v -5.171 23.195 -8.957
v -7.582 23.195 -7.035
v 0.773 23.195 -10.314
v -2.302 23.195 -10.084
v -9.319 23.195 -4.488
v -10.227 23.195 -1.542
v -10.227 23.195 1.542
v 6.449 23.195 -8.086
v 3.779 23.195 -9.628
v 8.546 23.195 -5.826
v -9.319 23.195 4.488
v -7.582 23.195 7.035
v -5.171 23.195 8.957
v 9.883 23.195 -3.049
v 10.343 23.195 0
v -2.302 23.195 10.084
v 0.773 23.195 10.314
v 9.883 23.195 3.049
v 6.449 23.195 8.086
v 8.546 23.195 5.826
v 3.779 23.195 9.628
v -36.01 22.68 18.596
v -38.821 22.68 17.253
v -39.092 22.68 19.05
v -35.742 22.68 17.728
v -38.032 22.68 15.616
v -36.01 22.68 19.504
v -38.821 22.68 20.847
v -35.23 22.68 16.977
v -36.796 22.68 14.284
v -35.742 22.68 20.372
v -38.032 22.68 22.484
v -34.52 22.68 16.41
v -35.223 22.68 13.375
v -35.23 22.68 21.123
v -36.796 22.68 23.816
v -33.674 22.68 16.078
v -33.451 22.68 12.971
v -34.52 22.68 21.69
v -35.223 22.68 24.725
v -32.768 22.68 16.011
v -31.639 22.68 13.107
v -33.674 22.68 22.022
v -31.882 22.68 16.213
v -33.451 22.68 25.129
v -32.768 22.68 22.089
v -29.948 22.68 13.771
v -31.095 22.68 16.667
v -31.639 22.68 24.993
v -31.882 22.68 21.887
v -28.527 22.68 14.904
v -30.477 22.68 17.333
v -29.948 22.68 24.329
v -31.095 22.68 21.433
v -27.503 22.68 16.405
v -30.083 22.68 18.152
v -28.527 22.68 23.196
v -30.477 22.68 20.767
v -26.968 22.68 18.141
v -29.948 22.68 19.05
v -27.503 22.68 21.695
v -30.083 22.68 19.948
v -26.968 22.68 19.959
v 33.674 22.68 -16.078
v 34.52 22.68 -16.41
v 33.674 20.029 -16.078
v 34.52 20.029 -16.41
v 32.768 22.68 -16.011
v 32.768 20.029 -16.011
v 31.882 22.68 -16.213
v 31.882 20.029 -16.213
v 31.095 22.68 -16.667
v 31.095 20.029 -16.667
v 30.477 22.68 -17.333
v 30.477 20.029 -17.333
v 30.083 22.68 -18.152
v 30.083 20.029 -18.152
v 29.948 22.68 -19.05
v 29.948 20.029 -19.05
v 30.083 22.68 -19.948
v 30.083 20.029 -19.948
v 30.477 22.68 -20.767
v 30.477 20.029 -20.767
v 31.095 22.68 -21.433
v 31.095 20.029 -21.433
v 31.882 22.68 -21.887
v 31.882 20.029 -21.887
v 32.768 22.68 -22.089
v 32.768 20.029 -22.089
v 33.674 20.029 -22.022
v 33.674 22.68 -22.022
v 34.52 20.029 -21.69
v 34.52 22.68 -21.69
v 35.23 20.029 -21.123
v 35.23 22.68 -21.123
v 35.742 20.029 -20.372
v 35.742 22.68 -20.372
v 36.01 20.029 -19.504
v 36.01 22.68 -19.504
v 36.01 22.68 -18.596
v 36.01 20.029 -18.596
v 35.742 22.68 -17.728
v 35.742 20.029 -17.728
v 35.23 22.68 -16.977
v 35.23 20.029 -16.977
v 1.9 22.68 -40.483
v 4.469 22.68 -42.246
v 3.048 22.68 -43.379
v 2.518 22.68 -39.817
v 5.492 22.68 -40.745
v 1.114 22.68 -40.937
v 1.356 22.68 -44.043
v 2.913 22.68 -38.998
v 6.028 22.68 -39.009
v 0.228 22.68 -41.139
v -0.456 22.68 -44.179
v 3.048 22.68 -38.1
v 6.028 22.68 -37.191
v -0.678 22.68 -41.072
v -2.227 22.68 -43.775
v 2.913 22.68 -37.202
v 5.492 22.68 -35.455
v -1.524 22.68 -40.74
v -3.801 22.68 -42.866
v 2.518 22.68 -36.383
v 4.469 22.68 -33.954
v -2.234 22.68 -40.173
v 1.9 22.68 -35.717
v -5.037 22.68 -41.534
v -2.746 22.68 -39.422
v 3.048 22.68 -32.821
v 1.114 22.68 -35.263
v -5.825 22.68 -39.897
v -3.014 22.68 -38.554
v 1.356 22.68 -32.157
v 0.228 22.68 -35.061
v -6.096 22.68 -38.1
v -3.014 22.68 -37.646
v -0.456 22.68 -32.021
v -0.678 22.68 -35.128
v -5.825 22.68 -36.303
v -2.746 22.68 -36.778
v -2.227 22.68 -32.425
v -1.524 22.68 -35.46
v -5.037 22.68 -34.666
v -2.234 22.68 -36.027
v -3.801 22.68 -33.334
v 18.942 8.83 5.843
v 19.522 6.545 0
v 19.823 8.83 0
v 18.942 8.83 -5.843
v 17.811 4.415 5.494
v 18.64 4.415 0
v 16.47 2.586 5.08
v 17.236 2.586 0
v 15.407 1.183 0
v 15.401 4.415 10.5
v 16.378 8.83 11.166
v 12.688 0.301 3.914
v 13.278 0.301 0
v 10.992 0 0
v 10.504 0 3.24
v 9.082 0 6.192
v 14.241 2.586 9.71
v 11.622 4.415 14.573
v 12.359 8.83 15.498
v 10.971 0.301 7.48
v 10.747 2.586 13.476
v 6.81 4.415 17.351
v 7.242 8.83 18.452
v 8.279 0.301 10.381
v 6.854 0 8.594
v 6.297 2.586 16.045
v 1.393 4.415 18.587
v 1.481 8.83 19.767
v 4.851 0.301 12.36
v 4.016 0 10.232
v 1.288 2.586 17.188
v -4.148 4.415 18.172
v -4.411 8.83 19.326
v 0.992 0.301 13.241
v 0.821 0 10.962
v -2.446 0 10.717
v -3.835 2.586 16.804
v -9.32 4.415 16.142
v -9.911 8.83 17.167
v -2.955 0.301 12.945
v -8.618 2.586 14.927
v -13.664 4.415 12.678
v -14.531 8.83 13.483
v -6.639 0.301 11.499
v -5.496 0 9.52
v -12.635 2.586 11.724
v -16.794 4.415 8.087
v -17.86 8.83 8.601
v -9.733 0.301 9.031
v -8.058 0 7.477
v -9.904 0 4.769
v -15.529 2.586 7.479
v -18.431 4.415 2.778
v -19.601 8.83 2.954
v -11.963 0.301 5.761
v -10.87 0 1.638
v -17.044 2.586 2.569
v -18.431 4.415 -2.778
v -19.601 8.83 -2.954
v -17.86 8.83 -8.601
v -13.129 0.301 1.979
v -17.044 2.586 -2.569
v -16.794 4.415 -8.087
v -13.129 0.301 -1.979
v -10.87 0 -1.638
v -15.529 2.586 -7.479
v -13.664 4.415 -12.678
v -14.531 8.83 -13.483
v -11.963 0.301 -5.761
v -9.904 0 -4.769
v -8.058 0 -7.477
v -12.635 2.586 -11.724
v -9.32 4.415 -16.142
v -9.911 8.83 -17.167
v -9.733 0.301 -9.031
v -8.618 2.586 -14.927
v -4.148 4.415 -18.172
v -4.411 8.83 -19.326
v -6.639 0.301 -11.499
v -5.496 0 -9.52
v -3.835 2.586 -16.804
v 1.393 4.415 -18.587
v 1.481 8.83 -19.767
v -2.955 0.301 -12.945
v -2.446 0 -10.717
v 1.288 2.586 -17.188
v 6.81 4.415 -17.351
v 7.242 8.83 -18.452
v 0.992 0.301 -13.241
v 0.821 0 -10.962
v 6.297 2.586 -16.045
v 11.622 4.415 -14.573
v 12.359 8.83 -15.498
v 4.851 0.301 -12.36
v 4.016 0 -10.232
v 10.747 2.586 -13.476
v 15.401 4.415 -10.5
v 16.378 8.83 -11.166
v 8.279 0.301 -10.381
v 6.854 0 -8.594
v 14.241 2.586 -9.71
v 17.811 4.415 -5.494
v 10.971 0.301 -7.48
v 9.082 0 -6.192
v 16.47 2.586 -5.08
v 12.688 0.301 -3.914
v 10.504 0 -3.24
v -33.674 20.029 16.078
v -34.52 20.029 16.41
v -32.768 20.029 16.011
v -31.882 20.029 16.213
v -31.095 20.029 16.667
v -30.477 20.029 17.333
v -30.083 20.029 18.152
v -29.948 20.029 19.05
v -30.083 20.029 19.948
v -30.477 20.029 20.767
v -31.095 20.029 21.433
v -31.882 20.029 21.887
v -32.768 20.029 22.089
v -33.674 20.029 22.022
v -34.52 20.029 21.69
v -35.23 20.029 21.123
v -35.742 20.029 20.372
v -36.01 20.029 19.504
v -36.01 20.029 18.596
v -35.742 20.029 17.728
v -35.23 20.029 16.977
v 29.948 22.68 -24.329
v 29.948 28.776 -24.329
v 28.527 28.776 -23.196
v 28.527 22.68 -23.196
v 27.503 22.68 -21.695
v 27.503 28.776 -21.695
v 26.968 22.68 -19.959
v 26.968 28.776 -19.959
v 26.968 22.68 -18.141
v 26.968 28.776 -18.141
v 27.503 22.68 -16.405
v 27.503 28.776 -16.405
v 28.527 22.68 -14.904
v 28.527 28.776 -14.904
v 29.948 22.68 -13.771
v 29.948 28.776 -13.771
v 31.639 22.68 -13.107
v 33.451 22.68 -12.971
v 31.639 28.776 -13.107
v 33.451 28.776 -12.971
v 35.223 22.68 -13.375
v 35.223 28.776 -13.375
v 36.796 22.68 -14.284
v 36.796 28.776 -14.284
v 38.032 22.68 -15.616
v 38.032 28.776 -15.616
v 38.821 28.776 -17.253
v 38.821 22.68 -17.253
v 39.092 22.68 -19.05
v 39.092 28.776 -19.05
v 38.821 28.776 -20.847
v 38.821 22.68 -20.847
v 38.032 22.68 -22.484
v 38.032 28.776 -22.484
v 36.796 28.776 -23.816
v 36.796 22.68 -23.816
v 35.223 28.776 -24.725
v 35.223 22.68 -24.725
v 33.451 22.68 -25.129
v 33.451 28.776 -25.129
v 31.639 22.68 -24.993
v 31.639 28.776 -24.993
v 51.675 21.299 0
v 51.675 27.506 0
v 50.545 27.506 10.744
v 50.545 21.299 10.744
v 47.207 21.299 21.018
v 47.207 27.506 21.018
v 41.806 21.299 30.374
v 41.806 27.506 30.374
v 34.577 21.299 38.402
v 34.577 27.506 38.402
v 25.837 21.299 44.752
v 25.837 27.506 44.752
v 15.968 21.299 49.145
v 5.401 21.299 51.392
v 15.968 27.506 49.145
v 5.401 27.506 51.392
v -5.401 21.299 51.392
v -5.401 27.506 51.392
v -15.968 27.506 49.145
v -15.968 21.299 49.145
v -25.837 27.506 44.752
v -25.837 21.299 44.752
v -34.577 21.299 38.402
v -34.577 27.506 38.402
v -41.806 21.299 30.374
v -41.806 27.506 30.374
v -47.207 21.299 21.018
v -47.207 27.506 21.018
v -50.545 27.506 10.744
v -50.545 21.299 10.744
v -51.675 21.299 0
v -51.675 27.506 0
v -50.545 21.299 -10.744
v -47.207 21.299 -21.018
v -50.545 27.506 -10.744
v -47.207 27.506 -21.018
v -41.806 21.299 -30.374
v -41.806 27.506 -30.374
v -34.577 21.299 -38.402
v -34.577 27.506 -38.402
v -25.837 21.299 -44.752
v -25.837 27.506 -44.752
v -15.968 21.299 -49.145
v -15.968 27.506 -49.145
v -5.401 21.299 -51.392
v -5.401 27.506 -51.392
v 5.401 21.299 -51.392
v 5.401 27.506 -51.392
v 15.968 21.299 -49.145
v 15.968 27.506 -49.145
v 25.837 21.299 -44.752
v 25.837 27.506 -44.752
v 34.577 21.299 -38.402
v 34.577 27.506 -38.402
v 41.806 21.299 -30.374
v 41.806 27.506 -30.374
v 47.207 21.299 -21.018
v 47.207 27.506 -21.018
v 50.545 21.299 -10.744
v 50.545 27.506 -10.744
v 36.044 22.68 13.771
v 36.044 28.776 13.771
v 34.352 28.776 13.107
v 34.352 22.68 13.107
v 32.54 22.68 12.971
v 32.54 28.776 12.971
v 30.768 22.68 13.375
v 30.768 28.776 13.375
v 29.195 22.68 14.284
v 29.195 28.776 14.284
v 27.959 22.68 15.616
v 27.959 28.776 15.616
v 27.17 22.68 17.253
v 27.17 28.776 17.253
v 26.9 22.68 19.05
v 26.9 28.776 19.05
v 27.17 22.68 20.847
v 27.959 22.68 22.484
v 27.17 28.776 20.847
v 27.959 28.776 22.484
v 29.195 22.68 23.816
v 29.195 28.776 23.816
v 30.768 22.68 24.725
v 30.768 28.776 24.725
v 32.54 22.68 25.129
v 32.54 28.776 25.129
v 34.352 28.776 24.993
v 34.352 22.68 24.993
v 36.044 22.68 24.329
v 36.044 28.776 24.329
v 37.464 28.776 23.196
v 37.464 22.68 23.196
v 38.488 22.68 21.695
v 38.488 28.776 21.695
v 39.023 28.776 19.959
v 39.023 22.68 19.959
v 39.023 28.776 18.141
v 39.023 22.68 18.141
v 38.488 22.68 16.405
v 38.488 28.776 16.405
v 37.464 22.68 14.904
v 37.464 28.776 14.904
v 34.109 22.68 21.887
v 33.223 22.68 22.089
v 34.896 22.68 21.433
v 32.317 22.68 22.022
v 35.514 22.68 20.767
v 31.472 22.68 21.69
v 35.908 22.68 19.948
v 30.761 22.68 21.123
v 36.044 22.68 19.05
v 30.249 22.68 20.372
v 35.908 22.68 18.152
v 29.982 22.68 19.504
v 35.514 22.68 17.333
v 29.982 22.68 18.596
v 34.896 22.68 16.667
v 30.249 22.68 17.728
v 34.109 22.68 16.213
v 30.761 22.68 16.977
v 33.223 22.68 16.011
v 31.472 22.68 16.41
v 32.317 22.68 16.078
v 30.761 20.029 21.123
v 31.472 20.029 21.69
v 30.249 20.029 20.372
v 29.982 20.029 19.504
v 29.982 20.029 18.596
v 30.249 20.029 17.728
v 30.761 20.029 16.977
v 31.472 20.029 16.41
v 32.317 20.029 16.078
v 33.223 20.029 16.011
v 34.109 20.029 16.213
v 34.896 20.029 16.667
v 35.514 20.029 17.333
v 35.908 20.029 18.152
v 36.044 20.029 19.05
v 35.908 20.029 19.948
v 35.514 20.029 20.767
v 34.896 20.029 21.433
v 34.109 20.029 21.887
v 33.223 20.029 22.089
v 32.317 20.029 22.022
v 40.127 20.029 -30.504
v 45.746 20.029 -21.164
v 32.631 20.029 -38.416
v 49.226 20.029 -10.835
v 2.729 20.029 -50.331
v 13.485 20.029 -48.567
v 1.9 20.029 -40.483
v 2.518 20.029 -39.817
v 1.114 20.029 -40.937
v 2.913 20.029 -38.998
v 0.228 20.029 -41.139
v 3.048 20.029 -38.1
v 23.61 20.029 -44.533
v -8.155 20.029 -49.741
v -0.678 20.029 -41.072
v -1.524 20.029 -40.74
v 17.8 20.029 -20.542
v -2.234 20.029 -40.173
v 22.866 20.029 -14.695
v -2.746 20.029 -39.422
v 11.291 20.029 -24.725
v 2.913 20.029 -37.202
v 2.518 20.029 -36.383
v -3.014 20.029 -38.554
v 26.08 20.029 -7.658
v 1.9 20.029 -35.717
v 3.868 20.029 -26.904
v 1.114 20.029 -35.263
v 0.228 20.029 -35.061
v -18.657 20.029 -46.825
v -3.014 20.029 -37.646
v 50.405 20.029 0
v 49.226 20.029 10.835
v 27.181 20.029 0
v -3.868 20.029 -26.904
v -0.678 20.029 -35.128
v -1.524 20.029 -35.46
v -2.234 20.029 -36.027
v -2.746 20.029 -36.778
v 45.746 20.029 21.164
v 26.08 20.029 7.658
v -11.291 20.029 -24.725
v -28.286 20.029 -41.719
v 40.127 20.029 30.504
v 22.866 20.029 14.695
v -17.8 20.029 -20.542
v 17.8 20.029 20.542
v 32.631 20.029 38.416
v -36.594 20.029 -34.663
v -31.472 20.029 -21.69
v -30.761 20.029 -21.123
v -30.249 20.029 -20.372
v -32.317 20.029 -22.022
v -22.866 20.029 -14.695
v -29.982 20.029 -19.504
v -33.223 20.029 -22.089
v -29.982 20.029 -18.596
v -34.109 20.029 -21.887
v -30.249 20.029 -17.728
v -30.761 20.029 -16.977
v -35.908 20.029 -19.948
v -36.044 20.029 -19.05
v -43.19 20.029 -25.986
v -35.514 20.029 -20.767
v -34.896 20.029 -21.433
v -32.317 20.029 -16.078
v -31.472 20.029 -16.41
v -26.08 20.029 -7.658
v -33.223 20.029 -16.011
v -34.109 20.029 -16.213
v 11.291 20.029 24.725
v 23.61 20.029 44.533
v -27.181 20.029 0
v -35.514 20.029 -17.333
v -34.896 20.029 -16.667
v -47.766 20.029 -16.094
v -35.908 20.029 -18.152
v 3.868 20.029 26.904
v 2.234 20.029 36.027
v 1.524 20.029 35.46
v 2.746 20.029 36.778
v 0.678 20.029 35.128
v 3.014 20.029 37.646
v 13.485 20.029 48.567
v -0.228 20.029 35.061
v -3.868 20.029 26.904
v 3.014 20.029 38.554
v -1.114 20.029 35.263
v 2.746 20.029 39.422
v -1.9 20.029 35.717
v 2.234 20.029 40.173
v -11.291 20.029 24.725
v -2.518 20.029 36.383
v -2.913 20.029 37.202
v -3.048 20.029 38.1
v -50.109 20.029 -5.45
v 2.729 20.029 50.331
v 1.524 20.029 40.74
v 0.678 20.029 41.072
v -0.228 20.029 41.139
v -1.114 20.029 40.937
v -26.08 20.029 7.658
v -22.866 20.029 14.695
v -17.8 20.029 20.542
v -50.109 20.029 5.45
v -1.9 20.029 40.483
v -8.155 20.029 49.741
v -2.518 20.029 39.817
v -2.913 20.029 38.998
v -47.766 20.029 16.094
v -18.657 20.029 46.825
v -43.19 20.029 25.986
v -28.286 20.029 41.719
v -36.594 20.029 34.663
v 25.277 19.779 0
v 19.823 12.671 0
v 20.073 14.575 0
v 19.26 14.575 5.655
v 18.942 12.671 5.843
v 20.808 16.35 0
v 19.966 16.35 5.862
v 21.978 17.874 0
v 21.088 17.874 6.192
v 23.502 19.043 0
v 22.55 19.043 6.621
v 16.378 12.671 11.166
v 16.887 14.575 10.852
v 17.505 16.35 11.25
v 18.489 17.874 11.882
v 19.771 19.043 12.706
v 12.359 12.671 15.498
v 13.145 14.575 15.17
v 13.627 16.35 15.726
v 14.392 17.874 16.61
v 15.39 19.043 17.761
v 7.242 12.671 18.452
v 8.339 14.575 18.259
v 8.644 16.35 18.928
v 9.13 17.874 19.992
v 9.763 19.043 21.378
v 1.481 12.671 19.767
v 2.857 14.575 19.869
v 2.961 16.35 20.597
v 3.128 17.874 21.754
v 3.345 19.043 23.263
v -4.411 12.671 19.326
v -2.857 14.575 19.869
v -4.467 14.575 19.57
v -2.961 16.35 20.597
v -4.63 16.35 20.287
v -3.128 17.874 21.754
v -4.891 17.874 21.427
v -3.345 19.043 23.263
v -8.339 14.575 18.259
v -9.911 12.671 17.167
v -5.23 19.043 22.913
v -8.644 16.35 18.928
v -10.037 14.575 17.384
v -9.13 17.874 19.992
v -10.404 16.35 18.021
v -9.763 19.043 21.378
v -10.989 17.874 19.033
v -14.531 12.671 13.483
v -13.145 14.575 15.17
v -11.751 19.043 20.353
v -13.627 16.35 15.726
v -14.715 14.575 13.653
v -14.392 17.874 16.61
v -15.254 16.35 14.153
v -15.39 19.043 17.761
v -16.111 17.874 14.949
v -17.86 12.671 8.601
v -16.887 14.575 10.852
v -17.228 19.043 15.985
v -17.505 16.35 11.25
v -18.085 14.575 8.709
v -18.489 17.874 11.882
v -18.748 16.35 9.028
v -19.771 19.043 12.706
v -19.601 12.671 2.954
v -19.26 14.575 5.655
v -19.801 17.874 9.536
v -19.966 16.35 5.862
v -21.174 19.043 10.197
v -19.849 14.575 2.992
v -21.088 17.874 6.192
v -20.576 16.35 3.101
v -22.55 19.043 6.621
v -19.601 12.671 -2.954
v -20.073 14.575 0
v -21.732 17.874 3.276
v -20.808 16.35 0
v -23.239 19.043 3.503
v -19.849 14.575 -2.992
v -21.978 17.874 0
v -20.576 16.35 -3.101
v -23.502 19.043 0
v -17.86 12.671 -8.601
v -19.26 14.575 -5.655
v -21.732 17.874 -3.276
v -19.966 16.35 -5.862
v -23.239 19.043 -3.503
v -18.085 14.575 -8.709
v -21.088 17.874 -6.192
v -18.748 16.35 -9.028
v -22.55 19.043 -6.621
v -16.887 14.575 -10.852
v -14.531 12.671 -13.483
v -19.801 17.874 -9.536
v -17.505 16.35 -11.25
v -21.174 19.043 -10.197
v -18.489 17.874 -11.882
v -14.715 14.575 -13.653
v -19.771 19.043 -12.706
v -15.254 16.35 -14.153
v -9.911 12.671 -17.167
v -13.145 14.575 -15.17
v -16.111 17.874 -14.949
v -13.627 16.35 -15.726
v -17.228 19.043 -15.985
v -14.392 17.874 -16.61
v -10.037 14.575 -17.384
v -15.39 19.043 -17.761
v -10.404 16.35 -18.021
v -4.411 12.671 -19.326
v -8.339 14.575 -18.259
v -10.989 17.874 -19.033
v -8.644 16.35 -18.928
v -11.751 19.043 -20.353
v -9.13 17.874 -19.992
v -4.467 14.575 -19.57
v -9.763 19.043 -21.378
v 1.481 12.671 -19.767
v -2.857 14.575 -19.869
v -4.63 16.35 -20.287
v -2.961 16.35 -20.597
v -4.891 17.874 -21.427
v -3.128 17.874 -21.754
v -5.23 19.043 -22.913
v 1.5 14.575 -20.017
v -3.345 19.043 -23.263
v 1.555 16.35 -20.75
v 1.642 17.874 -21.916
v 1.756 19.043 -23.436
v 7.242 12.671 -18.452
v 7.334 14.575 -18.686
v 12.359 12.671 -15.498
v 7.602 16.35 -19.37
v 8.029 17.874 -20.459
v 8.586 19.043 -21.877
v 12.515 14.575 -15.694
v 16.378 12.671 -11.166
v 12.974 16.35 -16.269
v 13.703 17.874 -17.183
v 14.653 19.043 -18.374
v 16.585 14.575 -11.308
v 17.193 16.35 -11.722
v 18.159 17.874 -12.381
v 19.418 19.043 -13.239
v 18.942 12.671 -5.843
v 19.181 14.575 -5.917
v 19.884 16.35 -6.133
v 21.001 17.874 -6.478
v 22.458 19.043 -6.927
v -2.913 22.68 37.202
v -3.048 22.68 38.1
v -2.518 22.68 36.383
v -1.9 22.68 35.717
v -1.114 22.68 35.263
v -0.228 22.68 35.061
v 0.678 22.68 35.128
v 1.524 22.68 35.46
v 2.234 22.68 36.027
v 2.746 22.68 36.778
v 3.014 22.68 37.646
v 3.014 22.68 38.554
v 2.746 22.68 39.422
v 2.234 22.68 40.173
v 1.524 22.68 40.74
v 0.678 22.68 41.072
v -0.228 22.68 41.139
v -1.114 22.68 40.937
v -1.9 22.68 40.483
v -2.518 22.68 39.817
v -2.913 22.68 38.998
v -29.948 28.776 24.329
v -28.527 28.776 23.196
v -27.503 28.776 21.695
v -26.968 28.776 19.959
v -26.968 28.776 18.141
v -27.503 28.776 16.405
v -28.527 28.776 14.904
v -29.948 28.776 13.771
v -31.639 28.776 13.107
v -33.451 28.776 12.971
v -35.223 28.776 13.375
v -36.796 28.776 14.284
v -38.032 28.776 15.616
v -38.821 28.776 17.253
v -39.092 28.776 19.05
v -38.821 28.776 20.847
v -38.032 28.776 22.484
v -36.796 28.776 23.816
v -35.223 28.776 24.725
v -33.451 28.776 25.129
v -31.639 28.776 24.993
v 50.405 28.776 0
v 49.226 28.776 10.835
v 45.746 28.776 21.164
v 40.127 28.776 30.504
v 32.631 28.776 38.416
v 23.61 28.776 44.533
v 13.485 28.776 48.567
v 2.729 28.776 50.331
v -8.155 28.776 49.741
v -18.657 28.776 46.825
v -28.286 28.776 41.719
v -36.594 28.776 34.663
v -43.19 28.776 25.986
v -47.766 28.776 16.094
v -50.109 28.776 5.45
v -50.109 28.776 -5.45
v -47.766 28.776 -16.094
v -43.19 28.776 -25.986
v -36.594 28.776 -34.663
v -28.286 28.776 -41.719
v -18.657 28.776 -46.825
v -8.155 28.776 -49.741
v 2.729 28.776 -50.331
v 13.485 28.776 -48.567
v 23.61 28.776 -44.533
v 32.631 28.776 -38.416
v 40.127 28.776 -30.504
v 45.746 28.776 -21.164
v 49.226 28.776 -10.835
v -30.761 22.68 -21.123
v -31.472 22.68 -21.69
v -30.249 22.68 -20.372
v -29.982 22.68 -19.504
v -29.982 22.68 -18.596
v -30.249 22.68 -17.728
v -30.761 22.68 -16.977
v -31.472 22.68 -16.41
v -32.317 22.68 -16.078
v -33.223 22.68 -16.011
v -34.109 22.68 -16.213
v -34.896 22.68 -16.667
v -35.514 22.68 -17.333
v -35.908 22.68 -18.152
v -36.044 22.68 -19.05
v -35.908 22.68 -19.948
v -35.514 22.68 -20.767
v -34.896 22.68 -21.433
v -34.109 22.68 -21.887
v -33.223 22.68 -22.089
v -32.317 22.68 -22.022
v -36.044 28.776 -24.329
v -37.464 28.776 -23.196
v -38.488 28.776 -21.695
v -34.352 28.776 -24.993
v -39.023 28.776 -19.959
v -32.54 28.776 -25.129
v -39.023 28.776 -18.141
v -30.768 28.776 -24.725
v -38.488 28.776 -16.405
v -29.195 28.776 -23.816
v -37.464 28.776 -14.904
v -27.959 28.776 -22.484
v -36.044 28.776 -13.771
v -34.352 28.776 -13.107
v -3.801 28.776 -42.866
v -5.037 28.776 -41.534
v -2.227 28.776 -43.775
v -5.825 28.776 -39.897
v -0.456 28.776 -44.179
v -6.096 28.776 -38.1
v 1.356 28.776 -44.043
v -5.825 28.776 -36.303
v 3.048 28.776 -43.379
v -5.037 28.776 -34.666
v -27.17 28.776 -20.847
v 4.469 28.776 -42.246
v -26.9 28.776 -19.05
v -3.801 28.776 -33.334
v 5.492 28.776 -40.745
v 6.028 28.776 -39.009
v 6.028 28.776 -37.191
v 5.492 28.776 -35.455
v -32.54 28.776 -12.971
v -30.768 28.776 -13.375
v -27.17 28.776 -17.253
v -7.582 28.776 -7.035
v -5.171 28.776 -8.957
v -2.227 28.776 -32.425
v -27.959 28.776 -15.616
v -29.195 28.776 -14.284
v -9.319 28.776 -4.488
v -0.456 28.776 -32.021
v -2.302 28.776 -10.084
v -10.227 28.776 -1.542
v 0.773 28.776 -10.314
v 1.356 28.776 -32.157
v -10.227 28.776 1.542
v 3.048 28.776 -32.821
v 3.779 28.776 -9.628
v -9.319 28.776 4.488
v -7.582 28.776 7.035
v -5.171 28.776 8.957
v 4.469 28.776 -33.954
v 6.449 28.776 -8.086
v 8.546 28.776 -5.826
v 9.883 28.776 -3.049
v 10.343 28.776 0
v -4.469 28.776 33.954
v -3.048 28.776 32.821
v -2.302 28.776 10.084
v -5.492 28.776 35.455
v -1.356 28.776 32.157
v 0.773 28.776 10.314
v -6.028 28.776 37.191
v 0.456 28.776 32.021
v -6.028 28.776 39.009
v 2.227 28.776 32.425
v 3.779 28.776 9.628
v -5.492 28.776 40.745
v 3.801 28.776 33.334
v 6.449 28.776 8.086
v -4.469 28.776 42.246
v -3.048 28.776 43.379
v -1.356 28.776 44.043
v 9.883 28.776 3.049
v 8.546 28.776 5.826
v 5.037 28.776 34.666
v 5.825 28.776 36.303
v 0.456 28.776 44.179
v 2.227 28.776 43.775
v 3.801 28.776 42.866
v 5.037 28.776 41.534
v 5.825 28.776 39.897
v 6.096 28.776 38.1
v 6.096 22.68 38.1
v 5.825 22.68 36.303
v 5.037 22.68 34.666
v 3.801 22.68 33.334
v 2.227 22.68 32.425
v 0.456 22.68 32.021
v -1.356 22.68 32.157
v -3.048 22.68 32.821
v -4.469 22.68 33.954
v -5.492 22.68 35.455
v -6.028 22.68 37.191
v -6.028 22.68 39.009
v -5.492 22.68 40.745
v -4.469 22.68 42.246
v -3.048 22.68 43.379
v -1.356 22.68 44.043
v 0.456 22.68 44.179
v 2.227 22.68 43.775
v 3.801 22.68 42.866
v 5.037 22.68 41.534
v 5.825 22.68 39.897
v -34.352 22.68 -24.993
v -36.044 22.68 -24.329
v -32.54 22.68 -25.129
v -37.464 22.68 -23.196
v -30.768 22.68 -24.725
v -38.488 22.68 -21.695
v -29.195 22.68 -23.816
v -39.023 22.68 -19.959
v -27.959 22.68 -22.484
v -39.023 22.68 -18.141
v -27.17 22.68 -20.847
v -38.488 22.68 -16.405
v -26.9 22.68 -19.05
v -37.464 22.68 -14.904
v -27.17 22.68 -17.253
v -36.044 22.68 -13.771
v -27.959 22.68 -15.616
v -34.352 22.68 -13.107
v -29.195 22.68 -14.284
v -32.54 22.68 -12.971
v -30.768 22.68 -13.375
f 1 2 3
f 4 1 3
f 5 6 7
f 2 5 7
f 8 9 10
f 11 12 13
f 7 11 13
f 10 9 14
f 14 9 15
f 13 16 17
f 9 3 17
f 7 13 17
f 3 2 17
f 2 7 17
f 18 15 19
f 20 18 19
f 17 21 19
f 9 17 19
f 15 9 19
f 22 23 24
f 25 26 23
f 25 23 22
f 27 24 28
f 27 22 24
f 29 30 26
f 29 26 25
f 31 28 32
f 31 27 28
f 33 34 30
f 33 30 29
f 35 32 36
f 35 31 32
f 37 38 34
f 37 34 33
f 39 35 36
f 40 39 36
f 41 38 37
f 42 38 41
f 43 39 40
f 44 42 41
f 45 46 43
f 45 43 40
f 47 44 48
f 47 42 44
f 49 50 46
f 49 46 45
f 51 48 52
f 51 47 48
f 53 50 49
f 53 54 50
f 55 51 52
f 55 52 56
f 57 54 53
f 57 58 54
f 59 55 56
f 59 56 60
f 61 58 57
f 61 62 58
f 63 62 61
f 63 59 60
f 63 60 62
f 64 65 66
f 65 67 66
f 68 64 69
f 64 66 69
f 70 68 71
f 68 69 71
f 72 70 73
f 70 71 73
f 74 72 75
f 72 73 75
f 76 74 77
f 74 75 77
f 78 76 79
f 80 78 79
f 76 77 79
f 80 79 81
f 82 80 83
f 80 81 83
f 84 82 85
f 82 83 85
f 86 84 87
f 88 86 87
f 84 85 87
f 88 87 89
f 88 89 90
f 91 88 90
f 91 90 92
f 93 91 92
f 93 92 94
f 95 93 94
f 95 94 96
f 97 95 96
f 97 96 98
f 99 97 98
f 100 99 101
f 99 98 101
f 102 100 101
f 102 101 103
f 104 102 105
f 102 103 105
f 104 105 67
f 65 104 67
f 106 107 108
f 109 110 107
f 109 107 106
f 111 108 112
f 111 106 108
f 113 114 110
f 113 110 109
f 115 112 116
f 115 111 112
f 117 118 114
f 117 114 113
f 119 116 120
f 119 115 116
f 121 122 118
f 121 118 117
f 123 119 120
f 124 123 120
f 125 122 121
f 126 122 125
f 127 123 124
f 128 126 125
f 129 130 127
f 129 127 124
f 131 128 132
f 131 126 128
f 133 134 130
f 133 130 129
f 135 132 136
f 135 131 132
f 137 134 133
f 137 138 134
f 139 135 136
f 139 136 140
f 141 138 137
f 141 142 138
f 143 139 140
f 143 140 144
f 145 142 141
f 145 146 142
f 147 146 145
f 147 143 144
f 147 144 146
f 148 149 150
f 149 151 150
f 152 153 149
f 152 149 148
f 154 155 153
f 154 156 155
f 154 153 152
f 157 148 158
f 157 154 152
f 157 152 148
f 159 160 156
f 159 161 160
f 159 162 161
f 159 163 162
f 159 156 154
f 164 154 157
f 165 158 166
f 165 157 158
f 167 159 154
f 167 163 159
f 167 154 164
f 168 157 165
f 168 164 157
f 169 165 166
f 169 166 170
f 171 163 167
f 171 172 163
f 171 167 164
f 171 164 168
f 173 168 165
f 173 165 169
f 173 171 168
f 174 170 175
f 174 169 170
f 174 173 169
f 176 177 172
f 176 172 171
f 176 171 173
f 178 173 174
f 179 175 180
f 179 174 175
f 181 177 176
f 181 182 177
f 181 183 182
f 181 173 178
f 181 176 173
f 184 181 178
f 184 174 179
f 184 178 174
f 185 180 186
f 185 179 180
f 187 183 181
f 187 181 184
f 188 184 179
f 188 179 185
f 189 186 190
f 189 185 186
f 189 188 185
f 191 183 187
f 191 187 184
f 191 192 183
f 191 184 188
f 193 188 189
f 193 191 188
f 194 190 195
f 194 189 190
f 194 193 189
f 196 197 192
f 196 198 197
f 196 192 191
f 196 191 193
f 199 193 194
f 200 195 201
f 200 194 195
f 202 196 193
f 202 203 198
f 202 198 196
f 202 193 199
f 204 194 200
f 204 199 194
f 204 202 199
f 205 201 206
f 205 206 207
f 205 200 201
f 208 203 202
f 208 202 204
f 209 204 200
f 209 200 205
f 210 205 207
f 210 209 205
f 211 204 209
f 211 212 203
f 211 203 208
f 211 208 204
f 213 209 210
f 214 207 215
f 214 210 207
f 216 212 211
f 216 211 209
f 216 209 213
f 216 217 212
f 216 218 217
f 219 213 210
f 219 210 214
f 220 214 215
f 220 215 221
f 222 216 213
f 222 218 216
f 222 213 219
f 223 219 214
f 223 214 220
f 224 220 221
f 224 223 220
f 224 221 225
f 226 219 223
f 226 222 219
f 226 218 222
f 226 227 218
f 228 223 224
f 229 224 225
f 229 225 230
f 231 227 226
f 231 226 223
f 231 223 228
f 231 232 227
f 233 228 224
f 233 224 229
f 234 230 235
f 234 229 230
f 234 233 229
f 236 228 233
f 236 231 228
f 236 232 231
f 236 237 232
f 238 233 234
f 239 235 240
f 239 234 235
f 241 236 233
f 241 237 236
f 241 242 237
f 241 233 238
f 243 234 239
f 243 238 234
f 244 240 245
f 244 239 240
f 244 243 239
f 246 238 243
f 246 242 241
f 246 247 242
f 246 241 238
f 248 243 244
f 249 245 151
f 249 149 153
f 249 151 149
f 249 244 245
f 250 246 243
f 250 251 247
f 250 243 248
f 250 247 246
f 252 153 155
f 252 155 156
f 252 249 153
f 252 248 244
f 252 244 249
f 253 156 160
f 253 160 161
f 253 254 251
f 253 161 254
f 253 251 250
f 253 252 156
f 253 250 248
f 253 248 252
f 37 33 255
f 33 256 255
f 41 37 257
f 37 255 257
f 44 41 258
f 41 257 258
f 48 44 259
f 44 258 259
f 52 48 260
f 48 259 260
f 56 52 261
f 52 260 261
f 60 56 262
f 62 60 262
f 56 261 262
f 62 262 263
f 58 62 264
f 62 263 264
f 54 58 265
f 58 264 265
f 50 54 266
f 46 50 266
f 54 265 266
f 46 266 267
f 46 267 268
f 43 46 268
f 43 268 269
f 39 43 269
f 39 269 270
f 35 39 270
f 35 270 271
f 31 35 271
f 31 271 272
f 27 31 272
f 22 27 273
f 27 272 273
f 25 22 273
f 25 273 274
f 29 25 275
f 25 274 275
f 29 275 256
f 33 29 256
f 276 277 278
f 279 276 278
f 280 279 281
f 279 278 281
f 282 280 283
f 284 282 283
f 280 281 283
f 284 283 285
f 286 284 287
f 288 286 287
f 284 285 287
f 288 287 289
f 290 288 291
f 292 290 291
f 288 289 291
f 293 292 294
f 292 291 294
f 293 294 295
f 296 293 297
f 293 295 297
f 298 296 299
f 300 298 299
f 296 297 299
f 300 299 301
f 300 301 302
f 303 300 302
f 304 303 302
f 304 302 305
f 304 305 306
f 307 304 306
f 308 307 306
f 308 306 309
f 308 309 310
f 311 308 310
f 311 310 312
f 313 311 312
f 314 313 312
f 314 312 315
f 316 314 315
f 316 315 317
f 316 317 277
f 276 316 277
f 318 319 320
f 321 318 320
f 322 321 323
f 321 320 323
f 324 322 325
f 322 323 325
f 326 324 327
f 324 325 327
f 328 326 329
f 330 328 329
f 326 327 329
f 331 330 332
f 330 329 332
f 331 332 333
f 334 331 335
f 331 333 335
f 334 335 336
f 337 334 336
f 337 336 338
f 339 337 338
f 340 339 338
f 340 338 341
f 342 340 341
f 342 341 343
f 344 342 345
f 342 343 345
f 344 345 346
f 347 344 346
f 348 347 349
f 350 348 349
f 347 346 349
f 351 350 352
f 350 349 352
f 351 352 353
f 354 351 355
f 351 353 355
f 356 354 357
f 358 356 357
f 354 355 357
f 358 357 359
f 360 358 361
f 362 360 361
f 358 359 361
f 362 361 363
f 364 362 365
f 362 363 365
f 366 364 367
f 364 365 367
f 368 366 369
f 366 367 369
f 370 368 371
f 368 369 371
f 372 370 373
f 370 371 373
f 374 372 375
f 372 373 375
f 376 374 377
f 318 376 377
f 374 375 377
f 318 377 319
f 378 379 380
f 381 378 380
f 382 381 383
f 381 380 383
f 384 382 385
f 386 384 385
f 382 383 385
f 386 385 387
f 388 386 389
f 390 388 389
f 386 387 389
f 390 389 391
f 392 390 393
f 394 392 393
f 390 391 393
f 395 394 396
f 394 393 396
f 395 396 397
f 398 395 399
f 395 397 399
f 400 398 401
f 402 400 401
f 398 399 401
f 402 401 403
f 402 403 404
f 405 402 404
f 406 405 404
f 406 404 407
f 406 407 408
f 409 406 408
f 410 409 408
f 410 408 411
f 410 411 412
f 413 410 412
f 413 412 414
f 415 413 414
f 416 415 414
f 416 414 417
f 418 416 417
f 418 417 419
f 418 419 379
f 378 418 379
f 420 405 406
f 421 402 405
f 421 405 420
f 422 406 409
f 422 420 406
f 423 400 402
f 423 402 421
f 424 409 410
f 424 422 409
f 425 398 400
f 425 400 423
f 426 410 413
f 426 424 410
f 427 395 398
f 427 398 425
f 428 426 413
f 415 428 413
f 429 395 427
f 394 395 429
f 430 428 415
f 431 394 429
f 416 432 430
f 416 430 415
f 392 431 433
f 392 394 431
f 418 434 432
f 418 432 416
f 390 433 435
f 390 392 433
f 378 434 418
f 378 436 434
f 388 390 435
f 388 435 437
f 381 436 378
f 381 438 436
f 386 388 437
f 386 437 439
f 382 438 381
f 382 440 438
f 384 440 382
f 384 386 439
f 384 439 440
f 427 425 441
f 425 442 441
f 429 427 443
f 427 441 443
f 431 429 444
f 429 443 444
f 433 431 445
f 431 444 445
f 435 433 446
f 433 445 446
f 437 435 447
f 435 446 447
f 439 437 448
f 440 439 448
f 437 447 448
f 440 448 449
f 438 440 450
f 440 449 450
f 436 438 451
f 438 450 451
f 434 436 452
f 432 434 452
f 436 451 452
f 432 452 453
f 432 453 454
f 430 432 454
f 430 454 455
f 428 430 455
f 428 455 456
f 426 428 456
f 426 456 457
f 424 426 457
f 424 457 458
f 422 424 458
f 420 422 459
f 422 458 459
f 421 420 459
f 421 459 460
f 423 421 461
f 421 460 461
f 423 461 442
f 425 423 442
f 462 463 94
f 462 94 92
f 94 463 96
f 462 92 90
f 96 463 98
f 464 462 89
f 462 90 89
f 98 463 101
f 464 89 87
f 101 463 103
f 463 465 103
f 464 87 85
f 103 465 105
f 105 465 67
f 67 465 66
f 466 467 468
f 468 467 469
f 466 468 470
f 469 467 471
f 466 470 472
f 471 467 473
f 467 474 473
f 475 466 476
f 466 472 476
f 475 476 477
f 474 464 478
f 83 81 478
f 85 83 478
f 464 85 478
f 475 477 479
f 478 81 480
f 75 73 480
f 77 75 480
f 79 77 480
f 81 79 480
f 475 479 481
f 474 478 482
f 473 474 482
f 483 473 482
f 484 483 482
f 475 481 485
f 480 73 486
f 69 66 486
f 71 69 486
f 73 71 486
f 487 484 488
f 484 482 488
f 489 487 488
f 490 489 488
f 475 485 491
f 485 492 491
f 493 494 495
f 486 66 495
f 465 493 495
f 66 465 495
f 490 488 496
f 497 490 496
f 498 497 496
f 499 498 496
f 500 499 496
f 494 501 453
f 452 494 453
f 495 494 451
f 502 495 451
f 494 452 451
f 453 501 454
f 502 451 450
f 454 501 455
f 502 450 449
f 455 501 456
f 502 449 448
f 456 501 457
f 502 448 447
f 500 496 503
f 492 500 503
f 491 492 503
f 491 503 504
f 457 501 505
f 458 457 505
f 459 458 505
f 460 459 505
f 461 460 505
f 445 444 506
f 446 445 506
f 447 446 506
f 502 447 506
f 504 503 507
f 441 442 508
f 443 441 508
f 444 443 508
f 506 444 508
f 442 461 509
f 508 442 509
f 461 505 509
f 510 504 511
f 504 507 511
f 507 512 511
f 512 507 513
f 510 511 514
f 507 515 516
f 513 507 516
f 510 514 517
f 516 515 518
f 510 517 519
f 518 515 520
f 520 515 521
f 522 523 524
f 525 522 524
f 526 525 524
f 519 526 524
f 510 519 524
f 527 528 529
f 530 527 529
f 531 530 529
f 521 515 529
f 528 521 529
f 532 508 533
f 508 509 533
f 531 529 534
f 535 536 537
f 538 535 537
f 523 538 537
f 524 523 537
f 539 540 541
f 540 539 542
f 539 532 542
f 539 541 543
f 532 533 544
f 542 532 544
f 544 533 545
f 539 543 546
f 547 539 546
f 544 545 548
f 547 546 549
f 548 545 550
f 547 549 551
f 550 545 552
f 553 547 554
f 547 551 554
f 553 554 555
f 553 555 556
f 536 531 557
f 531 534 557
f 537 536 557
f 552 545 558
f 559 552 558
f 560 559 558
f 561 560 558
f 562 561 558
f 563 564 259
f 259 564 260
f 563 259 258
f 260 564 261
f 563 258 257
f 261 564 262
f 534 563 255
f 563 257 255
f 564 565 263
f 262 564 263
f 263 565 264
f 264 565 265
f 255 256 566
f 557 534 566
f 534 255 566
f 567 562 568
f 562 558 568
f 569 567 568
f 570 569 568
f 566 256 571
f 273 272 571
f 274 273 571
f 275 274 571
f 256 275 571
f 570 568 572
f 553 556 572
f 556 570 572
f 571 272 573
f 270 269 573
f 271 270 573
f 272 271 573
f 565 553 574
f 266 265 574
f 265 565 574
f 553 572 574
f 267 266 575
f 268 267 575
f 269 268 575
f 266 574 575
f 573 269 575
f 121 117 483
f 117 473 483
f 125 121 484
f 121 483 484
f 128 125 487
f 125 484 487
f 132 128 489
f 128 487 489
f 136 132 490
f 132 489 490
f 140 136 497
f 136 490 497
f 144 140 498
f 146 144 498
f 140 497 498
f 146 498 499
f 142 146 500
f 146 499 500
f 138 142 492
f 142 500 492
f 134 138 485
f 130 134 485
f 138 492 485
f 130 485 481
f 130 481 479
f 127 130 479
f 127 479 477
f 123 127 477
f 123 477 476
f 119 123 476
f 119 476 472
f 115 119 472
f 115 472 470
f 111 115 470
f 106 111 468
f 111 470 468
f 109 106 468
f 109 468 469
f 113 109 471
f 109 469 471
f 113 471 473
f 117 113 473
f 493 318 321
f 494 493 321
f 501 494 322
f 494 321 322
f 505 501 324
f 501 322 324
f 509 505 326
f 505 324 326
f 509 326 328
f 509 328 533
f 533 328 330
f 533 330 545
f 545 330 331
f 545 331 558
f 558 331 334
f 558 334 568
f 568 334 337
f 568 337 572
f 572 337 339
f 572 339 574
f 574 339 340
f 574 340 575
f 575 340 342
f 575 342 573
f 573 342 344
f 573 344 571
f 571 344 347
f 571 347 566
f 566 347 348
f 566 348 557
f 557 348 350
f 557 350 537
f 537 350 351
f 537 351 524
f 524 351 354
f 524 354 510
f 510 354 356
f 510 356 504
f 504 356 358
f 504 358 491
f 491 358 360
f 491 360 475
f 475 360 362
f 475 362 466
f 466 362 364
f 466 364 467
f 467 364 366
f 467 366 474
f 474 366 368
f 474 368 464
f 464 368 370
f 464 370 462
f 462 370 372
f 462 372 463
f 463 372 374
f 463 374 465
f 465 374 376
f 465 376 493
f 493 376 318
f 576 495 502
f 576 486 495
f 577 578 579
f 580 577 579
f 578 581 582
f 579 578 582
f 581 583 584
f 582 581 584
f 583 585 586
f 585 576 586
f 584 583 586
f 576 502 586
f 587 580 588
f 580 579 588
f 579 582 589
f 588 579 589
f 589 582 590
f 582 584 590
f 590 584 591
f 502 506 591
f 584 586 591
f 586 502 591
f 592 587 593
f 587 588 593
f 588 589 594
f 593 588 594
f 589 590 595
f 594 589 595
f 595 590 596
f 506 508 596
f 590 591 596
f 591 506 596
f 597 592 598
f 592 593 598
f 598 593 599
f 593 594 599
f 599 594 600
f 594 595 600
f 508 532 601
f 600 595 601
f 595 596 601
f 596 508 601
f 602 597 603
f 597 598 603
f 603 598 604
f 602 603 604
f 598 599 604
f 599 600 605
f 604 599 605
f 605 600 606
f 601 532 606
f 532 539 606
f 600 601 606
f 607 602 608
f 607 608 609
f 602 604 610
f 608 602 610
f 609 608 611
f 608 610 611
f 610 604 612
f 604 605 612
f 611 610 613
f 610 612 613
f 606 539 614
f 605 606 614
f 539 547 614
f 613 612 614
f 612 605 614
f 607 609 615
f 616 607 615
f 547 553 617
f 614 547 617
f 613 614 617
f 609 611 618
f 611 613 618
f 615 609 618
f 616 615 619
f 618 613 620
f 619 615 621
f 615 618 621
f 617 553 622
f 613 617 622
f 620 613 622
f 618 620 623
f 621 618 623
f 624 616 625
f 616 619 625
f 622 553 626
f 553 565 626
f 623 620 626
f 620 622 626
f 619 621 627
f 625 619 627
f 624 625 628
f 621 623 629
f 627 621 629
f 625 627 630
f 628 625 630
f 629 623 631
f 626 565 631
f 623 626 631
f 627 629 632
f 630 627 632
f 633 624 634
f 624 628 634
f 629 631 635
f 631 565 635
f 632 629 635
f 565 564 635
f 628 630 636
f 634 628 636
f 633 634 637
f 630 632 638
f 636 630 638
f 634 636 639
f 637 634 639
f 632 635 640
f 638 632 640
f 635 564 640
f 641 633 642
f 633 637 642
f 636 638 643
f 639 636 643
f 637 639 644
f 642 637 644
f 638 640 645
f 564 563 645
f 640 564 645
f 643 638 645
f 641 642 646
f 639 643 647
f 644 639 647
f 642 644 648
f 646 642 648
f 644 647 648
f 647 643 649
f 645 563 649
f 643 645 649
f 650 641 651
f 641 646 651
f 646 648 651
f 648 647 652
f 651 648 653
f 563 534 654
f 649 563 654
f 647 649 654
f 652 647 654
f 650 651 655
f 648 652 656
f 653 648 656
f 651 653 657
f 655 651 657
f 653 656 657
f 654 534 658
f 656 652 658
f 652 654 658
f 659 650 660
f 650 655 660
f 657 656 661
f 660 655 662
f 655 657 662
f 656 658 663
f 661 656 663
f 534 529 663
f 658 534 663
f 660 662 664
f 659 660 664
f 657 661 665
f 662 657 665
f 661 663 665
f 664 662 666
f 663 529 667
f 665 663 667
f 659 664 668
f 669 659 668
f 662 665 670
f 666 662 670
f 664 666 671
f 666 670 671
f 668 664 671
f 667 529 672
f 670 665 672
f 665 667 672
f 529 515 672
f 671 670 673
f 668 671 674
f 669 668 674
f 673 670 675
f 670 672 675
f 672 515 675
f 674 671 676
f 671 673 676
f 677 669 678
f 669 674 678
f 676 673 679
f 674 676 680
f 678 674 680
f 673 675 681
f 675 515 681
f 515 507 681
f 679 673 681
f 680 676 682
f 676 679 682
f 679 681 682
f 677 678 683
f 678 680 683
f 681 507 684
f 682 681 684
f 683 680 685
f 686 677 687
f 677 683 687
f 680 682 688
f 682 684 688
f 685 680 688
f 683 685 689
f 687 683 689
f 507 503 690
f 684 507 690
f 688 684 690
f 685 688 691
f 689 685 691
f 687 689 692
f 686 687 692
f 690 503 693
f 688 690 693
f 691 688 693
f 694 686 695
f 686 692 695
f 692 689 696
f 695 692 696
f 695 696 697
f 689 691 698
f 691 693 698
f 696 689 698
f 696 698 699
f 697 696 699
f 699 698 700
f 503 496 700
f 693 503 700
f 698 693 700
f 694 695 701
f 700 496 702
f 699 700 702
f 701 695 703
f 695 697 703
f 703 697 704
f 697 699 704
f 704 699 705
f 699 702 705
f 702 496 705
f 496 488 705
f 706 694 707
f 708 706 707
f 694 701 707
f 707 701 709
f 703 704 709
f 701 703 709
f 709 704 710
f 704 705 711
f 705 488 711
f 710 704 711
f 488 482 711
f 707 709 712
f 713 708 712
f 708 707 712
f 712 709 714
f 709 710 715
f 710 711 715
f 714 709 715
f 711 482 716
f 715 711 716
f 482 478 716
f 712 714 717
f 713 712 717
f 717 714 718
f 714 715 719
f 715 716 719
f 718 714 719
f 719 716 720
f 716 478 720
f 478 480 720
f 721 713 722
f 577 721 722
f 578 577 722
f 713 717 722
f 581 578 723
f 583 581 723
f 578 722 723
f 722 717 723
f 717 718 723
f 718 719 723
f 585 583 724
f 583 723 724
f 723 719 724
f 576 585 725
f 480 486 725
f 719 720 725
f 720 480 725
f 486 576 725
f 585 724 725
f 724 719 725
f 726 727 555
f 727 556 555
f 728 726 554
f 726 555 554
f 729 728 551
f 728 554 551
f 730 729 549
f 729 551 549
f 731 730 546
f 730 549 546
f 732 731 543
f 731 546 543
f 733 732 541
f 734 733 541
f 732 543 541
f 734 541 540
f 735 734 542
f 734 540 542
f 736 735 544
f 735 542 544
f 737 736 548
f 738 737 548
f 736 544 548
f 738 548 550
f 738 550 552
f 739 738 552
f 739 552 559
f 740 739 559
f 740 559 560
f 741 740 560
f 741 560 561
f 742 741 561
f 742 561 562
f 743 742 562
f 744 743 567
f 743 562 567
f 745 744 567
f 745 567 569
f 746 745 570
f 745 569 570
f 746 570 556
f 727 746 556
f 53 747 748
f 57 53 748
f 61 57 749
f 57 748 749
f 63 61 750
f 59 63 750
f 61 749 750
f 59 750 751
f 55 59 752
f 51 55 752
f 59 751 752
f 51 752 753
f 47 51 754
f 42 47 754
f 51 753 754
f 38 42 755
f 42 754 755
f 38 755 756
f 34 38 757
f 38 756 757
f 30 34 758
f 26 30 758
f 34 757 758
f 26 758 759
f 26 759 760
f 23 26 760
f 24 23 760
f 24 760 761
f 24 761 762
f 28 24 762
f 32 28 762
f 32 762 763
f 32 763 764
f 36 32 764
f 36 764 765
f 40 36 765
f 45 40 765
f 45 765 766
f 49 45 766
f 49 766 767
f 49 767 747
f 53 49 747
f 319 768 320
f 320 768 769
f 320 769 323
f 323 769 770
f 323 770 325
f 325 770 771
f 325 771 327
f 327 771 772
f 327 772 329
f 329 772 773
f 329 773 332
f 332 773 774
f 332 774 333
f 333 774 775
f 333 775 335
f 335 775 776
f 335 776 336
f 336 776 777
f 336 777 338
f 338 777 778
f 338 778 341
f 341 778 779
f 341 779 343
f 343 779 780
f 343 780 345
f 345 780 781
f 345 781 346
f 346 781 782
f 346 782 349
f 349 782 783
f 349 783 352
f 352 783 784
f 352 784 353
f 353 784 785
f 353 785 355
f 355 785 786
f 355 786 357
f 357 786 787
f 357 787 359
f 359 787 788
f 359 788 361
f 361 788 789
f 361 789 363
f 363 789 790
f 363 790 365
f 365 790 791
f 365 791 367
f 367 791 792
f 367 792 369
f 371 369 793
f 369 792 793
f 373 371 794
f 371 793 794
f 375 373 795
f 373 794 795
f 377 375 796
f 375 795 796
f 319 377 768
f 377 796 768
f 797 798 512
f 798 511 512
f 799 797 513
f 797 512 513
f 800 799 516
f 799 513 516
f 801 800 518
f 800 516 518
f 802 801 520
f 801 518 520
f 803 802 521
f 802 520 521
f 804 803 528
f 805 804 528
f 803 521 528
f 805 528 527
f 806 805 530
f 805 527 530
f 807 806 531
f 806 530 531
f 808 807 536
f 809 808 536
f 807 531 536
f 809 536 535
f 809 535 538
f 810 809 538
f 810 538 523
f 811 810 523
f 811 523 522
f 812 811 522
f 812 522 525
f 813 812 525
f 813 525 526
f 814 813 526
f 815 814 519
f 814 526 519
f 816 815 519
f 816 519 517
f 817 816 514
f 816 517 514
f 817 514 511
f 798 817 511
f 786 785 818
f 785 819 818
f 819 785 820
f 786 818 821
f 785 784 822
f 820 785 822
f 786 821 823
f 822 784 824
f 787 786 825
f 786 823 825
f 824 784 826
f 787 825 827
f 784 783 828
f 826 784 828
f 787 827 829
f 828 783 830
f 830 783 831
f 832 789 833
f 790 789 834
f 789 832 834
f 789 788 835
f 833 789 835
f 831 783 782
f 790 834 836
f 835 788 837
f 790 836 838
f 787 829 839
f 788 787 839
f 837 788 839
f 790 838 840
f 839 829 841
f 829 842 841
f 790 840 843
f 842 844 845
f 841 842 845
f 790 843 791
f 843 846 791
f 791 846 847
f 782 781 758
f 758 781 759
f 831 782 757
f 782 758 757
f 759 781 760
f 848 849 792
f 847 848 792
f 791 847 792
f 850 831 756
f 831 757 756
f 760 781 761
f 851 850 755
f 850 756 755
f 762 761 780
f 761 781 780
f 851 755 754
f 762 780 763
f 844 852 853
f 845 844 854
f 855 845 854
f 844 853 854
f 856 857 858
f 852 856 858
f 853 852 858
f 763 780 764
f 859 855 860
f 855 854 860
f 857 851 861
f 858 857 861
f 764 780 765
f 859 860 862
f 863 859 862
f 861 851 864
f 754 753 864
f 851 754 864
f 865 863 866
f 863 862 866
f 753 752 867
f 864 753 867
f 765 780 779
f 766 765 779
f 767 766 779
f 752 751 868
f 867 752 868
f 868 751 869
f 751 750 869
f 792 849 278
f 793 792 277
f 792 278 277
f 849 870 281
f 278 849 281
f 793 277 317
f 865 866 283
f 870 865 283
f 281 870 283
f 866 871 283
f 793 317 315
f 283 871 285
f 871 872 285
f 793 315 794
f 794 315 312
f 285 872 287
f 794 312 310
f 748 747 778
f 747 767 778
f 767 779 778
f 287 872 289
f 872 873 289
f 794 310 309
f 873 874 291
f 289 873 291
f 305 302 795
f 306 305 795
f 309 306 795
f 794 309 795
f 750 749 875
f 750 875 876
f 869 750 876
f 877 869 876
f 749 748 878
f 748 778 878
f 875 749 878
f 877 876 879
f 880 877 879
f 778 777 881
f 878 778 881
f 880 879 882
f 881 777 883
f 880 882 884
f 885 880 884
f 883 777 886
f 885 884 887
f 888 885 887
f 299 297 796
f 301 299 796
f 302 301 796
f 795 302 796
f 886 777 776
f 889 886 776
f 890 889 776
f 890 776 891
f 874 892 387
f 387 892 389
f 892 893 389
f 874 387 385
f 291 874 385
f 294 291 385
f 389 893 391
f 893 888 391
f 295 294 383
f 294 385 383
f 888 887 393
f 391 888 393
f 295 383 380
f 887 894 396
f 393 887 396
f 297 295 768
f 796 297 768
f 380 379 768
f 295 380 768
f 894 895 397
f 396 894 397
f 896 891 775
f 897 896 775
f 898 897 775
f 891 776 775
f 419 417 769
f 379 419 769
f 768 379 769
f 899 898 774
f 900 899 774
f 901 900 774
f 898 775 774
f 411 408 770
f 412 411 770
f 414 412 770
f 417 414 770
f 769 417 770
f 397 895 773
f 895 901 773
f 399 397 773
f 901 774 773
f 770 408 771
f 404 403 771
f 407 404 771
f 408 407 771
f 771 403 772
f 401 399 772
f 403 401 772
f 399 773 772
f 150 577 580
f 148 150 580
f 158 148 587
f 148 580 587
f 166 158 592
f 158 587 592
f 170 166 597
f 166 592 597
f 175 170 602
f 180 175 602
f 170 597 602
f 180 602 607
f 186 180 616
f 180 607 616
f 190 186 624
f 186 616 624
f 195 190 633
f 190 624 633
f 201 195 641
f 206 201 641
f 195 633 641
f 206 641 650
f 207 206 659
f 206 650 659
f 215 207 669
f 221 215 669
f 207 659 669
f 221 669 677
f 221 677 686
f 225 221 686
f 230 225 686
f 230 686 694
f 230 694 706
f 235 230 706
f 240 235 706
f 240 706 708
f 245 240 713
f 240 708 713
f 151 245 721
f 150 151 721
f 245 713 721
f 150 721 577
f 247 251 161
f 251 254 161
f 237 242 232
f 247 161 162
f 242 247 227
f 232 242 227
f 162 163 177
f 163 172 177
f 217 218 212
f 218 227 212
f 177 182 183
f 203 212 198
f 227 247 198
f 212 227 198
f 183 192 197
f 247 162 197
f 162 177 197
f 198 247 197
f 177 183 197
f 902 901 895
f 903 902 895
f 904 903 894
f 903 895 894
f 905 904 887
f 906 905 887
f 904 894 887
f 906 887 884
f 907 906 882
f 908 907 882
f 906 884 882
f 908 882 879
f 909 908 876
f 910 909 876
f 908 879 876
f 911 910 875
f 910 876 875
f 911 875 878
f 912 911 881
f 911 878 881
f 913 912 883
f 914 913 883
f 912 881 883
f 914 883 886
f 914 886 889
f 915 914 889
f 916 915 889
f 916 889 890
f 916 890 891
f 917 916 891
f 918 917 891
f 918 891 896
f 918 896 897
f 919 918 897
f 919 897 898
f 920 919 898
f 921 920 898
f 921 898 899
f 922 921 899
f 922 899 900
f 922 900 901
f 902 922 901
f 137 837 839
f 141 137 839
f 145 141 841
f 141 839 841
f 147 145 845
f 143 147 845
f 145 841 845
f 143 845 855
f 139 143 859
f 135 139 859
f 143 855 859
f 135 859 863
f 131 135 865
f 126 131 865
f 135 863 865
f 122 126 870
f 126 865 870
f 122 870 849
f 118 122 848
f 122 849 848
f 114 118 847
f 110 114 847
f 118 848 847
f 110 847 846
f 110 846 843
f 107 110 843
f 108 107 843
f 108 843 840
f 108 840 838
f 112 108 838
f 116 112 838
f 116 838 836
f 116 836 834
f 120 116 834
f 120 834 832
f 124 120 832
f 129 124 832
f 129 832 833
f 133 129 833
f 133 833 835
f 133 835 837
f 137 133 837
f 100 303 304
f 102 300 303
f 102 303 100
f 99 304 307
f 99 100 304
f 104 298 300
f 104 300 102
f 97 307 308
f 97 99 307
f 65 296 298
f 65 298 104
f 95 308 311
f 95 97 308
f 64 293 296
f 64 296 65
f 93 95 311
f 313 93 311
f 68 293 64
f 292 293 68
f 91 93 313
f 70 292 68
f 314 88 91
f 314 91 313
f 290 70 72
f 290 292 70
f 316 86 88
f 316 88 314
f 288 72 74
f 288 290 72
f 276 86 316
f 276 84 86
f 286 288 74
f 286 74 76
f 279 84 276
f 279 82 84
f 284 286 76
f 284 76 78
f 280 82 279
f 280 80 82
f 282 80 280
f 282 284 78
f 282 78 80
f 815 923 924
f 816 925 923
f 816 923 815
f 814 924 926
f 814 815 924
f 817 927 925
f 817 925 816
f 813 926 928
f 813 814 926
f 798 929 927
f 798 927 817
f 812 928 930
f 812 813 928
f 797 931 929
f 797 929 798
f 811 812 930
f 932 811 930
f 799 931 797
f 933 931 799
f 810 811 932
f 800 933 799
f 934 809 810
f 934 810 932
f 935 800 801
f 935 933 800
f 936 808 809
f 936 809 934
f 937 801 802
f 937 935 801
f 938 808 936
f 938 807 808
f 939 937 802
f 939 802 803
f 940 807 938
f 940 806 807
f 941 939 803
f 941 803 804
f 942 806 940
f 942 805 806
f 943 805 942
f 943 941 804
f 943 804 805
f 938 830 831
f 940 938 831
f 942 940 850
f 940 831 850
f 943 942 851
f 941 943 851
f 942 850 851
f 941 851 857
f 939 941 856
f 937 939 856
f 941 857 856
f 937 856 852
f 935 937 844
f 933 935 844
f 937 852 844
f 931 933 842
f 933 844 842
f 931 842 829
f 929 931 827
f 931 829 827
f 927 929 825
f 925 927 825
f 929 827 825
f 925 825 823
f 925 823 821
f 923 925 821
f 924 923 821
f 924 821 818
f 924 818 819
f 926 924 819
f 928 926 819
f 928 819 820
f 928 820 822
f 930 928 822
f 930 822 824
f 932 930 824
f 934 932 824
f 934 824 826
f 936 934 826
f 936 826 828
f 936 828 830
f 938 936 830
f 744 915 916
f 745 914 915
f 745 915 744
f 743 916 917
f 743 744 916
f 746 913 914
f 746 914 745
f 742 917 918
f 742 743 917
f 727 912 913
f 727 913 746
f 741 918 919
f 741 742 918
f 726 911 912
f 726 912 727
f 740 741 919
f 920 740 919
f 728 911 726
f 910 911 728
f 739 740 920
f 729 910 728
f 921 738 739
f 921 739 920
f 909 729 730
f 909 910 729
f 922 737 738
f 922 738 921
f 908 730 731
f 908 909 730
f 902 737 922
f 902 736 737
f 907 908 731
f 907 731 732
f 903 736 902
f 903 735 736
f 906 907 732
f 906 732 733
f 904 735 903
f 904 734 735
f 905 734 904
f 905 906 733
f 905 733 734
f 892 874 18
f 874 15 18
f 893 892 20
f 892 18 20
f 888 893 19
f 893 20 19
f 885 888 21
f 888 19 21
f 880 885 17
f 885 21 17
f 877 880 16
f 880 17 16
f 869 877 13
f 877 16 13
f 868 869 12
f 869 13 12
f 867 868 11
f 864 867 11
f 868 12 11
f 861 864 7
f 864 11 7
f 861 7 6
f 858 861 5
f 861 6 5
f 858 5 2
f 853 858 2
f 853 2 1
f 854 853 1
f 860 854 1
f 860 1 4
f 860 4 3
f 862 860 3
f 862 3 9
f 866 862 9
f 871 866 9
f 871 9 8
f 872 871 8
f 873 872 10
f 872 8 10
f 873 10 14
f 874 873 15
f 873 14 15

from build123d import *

# Parameters (mm, degrees)
F4_D            = 6.096
F4_CBORE_D      = 12.192
F4_CBORE_DEPTH  = 6.096
F4_COPIES_COUNT = 6
F5_R            = 7.3585229381
F6_R            = 8.8302275257
F7_SIZE         = 1.27


# Not quite as in the source:
# - a pattern or mirror of a feature is missing from the dataset's text; its kind, count and spacing are read off the source's solid


with BuildPart() as f2:
    # F1 (on Top) → F2 (revolve)
    with BuildSketch(Plane.XY):
        Polygon((0, 23.1950208545), (0, 0), (19.8225509375, 0), (19.8225509375, 20.0292905793), (51.67459324, 20.0292905793), (51.67459324, 28.776070103), (10.3429872543, 28.776070103), (10.3429872543, 23.1950208545), align=None)
    revolve(axis=Axis((0, 11.5975104272, 0), (0, -1, 0)))

    # F4 (through all)
    with Locations(Plane(origin=(0, 28.776070103, 0), x_dir=(-1, 0, 0), z_dir=(0, 1, 0))):
        with Locations((0, -38.1)):
            f4 = CounterBoreHole(F4_D / 2, F4_CBORE_D / 2, F4_CBORE_DEPTH)

    # F4_copies: F4 ×6 about axis
    f4_copies_axis = Axis((0, 0, 0), (0, 1, 0))
    for i in range(1, F4_COPIES_COUNT):
        add(f4.rotate(f4_copies_axis, i * 360 / F4_COPIES_COUNT), mode=Mode.SUBTRACT)

    # F5
    f5_edges = [f2.edges().sort_by_distance(p)[0] for p in [
        (-19.822551, 20.029291, 0),
    ]]
    fillet(f5_edges, radius=F5_R)

    # F6
    f6_edges = [f2.edges().sort_by_distance(p)[0] for p in [
        (-19.822551, 0, 0),
    ]]
    fillet(f6_edges, radius=F6_R)

    # F7
    f7_edges = [f2.edges().sort_by_distance(p)[0] for p in [
        (-51.674593, 20.029291, 0),
        (-51.674593, 28.77607, 0),
    ]]
    chamfer(f7_edges, length=F7_SIZE)


solid = f2.part
